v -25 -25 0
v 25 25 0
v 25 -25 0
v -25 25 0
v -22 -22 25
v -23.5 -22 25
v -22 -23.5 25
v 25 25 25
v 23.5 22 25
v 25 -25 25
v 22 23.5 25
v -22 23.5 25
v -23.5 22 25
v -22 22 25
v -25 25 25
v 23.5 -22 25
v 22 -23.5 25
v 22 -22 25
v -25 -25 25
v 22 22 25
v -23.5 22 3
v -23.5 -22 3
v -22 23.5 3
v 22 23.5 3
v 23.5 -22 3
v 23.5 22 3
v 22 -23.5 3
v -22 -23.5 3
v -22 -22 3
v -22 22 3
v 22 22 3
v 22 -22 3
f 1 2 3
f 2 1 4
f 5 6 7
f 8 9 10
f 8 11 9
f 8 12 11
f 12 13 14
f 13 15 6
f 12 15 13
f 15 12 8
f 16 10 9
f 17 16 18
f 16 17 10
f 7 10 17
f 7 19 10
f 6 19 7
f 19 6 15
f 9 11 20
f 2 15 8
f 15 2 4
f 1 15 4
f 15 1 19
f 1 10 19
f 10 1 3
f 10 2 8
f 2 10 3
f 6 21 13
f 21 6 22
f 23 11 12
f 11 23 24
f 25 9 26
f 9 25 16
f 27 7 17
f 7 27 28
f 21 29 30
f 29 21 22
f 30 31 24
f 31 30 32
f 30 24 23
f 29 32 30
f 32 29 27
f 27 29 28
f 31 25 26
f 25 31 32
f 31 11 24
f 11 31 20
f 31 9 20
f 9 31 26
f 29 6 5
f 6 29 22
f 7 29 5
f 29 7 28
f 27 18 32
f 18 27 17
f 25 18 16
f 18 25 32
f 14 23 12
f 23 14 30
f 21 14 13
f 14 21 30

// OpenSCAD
//basic af box

//CUSTOMIZER VARIABLES

//Length
x = 50; // [1:150]
//Width
y = 50; // [1:150]
//Height
z = 25; // [1:150]

wall_thickness = 3; // [1:150]

base_thickness = 3; // [1:150]

rotate_angle = 0; // [0,15,30,45]

//CUSTOMIZER VARIABLES END

linear_extrude(z){
    difference(){
        square([x,y],true);                    
        square([x - wall_thickness,y - wall_thickness],true);
}}

linear_extrude(base_thickness){ 
    square([
    x - wall_thickness,
    y - wall_thickness],true);
}

translate([(x-wall_thickness)/2,(y-wall_thickness)/2,0])
rotate(rotate_angle)
linear_extrude(z){
    square(wall_thickness,true);
}

translate([(wall_thickness-x)/2,(wall_thickness-y)/2,0])
rotate(rotate_angle)
linear_extrude(z){
    square(wall_thickness,true);
}

translate([(x-wall_thickness)/2,(-y+wall_thickness)/2,0])
rotate(rotate_angle)
linear_extrude(z){
    square(wall_thickness,true);
}

translate([(-x+wall_thickness)/2,(y-wall_thickness)/2,0])
rotate(rotate_angle)
linear_extrude(z){
    square(wall_thickness,true);
}
